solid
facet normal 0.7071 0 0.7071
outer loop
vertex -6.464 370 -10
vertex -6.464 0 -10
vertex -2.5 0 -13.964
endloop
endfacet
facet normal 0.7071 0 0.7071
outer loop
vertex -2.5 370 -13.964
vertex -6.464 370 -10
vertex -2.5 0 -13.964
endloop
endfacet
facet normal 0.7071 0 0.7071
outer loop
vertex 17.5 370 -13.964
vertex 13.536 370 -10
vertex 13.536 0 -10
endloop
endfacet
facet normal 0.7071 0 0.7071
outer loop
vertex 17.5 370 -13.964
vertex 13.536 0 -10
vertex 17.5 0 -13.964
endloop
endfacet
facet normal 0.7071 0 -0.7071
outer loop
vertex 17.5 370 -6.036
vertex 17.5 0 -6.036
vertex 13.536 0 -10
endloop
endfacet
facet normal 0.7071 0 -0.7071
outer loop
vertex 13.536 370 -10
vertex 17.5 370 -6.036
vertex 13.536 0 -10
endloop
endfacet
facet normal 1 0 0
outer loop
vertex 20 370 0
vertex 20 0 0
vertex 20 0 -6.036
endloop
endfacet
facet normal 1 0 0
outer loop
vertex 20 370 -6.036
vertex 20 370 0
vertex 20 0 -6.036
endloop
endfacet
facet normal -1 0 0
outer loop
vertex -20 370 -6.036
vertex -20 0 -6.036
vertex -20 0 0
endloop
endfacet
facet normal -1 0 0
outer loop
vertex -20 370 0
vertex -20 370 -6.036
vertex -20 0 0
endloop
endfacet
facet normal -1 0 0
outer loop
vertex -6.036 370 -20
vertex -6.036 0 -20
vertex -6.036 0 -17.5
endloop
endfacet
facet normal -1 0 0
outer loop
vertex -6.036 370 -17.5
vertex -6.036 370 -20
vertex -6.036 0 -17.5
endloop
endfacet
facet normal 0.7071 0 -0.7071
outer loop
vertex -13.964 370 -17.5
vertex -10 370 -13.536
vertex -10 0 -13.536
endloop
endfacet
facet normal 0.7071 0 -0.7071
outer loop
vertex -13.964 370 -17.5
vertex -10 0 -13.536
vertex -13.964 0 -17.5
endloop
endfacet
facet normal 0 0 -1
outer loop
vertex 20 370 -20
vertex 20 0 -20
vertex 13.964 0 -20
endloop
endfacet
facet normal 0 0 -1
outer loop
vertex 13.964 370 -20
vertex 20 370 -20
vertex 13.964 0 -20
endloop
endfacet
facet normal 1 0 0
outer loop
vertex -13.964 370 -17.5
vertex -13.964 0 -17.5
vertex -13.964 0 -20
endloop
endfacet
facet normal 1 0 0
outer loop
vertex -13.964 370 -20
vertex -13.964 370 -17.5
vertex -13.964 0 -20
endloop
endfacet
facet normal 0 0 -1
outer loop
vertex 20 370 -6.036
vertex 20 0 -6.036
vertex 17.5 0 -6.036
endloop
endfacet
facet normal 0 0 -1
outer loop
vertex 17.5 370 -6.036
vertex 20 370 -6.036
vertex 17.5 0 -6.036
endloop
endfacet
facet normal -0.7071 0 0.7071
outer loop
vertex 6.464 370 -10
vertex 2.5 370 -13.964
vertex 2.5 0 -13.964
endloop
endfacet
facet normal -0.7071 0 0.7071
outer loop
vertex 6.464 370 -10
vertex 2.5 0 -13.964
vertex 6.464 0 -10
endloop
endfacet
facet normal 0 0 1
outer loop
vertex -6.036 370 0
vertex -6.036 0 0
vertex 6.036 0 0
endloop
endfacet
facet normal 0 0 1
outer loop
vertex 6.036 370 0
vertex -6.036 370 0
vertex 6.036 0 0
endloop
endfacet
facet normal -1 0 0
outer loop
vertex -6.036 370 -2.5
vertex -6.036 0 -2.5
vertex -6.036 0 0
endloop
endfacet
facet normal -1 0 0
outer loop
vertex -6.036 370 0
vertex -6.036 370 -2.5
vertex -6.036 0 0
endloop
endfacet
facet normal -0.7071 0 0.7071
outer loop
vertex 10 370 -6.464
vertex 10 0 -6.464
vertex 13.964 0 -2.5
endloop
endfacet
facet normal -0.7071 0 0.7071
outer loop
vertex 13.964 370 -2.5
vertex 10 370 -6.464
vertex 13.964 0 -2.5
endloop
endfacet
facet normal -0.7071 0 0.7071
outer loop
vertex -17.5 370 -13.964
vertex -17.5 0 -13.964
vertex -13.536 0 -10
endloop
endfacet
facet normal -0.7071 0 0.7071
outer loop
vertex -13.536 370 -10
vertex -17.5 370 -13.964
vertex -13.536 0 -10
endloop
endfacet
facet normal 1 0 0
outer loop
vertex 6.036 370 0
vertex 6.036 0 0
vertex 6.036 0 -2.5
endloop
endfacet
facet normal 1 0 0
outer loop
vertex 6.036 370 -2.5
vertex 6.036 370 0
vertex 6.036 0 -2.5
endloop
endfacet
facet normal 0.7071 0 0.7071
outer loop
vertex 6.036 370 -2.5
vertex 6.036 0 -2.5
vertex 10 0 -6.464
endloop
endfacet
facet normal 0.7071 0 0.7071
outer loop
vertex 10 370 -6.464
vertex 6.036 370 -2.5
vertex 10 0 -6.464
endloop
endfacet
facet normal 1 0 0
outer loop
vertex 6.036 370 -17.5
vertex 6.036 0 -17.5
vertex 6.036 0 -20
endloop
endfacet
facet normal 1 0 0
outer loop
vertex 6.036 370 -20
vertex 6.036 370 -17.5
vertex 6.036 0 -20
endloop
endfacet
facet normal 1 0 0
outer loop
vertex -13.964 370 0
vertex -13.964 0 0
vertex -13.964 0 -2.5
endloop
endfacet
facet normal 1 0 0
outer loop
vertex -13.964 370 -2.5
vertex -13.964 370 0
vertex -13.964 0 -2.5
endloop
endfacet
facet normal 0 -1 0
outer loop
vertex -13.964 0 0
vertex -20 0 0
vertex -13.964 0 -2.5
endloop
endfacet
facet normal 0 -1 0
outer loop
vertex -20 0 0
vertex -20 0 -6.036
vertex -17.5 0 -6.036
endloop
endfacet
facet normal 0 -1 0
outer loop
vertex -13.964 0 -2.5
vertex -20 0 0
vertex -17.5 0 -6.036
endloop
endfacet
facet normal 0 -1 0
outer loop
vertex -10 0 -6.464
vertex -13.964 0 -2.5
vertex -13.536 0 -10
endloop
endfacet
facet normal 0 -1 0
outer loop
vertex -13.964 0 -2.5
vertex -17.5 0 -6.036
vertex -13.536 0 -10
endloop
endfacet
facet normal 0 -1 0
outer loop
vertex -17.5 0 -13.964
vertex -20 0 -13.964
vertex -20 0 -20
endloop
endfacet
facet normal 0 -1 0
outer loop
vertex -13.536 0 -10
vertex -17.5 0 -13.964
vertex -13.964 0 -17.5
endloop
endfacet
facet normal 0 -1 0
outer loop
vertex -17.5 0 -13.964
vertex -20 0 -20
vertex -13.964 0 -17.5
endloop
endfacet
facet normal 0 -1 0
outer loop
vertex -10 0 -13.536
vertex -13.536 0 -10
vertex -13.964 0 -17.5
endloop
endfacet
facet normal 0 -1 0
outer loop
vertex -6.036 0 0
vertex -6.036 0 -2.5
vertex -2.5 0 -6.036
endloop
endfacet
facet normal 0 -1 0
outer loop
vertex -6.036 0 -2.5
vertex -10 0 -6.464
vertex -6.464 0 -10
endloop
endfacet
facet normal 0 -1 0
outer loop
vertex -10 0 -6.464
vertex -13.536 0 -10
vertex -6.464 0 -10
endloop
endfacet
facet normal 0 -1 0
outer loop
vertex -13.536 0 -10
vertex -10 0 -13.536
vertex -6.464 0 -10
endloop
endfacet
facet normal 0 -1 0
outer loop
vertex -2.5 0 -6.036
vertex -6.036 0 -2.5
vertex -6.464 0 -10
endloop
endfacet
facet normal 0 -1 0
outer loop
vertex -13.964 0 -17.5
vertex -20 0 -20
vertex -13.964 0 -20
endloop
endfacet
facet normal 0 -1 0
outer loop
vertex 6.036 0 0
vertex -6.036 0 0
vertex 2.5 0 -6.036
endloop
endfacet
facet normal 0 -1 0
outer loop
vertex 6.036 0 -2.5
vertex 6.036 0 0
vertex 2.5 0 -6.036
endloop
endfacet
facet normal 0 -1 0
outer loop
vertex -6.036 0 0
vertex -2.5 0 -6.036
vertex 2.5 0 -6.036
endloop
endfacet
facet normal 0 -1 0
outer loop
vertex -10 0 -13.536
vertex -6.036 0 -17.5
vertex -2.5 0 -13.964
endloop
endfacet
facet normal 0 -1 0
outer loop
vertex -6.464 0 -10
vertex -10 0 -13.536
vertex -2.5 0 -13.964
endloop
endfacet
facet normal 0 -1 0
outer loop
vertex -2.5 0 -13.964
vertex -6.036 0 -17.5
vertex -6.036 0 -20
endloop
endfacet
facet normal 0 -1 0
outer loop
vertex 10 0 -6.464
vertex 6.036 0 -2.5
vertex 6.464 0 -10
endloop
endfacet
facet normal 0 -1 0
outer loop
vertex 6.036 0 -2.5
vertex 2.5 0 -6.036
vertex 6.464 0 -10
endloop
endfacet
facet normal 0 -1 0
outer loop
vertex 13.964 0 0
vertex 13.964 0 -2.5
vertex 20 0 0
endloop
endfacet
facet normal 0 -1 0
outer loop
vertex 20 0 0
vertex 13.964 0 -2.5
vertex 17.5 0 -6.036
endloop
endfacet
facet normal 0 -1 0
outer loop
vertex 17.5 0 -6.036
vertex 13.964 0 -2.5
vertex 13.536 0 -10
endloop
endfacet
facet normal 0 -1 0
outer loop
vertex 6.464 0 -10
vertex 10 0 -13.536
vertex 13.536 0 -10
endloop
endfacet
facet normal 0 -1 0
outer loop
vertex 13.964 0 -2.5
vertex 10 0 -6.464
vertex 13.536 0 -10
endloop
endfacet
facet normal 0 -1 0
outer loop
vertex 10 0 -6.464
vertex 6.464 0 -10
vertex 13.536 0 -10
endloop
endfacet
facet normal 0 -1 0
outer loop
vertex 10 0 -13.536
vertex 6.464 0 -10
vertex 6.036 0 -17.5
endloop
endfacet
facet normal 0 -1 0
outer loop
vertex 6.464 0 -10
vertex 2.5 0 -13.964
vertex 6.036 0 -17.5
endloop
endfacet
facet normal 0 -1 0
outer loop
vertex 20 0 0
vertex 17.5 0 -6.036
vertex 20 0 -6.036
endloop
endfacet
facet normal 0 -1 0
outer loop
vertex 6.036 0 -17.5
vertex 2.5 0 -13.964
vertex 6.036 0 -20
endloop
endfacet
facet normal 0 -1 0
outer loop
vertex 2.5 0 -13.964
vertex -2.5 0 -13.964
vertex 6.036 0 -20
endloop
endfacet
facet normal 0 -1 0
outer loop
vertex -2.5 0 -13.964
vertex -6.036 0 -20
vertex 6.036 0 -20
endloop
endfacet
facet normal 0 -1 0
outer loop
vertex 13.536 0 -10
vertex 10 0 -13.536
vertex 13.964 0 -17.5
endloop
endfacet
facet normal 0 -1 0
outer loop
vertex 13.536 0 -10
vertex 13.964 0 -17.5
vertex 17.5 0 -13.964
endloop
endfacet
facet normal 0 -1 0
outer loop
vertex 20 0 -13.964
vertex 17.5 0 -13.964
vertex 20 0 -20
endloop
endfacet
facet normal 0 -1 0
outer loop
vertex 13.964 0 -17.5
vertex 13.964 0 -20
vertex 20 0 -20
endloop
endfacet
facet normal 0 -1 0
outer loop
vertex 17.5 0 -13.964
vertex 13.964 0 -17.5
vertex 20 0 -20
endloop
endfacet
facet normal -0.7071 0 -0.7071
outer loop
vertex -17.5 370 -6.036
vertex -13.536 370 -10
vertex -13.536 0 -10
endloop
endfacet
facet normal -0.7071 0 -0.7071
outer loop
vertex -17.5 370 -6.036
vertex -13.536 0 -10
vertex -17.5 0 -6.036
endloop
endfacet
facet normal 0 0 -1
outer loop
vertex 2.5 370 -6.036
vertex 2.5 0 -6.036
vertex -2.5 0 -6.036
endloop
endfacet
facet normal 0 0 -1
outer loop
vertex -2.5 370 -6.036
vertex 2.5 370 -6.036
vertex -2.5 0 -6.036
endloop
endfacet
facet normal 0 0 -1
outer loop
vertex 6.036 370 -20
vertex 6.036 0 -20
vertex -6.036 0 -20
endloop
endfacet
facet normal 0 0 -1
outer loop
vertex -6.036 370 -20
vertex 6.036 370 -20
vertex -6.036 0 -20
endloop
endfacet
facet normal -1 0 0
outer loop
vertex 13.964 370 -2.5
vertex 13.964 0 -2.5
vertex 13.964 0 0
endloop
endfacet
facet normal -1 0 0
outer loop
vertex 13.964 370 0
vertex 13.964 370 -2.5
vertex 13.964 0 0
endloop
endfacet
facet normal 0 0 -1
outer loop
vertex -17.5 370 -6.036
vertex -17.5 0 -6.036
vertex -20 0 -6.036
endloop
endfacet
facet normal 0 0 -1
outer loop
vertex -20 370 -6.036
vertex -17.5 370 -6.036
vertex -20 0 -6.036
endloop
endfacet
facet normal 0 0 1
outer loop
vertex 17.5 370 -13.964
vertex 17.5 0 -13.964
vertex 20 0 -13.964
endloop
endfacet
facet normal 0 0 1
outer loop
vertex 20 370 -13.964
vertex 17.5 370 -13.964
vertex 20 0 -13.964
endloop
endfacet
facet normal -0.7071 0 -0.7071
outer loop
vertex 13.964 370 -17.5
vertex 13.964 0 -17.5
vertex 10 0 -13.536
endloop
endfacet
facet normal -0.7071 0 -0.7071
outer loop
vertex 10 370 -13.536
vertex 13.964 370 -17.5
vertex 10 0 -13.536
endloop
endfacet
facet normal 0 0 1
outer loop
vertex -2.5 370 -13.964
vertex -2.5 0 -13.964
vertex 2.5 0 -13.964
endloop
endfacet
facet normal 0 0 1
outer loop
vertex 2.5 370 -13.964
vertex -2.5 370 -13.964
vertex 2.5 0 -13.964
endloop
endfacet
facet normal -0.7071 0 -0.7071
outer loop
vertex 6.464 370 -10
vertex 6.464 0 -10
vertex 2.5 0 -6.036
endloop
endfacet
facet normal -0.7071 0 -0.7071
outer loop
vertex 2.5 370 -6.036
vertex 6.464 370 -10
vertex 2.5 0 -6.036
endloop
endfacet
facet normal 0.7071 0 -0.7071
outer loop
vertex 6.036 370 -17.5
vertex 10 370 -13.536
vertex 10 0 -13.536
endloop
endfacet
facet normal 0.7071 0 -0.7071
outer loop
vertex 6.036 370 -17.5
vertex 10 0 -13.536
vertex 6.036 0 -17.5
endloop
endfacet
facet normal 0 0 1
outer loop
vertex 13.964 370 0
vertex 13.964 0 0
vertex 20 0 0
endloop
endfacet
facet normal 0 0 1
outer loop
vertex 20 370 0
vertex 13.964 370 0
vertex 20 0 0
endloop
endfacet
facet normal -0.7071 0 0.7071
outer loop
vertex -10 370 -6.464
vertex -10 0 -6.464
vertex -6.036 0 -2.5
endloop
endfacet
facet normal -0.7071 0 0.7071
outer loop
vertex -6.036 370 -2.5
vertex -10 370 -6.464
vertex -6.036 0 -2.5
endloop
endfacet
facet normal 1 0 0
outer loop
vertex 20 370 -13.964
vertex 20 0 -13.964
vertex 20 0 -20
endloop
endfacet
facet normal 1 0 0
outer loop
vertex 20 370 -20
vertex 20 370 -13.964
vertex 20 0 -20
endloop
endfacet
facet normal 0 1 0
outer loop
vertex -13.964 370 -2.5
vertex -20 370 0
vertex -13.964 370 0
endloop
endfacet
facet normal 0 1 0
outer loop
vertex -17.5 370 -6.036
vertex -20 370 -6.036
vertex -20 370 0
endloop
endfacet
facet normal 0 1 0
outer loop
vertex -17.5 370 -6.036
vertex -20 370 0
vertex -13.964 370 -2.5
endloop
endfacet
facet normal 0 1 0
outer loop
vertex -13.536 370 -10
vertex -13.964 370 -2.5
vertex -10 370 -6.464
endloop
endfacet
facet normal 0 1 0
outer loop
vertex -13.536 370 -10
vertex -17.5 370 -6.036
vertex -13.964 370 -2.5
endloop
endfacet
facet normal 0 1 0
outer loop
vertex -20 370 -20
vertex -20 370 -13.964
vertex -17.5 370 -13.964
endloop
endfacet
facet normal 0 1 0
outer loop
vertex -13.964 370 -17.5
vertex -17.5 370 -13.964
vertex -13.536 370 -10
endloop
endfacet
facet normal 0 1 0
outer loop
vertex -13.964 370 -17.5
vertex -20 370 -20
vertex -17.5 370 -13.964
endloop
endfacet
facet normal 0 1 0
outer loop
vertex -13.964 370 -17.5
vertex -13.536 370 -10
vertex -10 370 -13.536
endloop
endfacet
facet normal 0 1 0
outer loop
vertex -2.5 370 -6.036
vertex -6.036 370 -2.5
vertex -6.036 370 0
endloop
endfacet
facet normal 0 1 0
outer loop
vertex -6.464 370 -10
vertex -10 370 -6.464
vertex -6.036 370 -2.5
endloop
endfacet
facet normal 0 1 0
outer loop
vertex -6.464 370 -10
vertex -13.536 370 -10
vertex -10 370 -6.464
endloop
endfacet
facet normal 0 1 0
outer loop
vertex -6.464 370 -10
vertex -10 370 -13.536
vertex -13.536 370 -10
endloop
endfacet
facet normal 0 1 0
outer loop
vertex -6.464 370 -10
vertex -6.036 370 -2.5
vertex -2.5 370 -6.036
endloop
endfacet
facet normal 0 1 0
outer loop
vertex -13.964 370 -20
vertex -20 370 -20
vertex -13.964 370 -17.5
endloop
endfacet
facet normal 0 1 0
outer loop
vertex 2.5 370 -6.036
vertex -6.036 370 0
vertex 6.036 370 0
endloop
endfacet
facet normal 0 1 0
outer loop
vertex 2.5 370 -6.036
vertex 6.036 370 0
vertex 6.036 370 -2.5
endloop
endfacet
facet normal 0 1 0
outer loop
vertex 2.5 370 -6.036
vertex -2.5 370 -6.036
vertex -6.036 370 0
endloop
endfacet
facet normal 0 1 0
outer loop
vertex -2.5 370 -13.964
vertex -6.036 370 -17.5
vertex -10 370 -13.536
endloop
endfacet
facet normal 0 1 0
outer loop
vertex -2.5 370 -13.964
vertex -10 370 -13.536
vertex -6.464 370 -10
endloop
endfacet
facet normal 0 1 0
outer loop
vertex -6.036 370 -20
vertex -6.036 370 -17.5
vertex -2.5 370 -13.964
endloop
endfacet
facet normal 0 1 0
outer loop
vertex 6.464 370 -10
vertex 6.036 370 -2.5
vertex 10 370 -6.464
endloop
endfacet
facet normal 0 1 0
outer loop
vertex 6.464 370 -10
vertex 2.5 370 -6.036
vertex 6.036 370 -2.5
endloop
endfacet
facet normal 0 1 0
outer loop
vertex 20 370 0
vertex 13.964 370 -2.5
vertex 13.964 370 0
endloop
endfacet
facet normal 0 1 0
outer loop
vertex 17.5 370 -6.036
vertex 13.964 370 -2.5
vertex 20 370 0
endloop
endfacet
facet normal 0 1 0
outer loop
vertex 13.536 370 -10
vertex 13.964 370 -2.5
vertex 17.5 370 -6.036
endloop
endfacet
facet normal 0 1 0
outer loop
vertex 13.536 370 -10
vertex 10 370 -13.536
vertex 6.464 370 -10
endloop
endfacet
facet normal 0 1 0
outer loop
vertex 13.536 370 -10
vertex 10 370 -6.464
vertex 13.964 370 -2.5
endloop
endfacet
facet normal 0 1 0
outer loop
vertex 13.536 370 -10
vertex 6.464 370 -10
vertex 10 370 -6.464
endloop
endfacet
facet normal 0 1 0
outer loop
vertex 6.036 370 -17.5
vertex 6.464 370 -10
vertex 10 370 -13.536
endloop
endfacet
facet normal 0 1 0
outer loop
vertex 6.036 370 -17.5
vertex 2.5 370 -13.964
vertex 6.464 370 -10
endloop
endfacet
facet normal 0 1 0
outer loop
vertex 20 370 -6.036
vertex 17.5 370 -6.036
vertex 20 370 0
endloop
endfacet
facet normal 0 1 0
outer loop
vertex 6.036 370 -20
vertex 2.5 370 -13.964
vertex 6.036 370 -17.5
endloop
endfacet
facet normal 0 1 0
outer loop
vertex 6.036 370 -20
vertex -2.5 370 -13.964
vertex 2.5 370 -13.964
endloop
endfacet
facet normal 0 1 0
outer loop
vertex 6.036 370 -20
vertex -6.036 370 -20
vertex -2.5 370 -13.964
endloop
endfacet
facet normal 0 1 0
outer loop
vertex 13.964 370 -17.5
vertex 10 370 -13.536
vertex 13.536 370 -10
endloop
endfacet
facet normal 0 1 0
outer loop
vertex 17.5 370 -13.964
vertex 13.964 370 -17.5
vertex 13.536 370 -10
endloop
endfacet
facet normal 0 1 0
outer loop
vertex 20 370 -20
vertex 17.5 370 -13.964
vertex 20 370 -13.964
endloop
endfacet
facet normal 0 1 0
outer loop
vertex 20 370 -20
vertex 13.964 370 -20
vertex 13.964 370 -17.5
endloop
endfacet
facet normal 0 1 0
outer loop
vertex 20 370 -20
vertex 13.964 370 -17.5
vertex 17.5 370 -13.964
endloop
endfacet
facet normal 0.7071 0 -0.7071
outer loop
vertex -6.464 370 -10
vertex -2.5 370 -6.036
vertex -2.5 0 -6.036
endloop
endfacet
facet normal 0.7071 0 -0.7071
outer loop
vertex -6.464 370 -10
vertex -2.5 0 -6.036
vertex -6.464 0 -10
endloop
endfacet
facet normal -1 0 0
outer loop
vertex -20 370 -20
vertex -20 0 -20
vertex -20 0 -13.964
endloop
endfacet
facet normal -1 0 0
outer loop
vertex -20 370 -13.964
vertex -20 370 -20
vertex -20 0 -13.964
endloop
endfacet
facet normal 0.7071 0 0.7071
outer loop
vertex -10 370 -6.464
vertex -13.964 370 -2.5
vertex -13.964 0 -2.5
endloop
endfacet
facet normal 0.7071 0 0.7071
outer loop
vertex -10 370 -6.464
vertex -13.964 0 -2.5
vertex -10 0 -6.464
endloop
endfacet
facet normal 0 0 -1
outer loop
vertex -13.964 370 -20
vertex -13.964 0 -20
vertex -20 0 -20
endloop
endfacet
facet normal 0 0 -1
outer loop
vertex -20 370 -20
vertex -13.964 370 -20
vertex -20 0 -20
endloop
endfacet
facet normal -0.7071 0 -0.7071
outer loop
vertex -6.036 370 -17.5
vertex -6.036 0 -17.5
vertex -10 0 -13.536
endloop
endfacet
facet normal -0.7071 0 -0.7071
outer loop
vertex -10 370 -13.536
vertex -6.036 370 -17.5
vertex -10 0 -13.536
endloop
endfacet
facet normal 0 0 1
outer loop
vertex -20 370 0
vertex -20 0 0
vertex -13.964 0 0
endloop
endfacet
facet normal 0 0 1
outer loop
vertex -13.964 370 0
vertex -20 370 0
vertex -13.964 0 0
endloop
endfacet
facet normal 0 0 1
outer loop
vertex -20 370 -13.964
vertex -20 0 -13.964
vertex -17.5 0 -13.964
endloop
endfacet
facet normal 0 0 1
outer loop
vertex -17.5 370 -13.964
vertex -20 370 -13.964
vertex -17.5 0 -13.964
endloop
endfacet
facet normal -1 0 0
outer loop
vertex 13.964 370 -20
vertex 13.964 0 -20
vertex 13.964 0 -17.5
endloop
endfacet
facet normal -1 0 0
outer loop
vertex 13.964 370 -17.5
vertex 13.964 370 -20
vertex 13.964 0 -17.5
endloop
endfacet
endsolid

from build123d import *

# Parameters (mm, degrees)
BOSS_EXTRU_2_DEPTH = 370


with BuildPart() as part:
    # Esquisse1<3> → Boss.-Extru.2 (new body)
    with BuildSketch(Plane(origin=(0, 0, 0), x_dir=(1, 0, 0), z_dir=(0, 1, 0))):
        Polygon((-6.035533906, 17.5), (-10, 13.535533906), (-13.964466094, 17.5), (-13.964466094, 20), (-20, 20), (-20, 13.964466094), (-17.5, 13.964466094), (-13.535533906, 10), (-17.5, 6.035533906), (-20, 6.035533906), (-20, 0), (-13.964466094, 0), (-13.964466094, 2.5), (-10, 6.464466094), (-6.035533906, 2.5), (-6.035533906, 0), (6.035533906, 0), (6.035533906, 2.5), (10, 6.464466094), (13.964466094, 2.5), (13.964466094, 0), (20, 0), (20, 6.035533906), (17.5, 6.035533906), (13.535533906, 10), (17.5, 13.964466094), (20, 13.964466094), (20, 20), (13.964466094, 20), (13.964466094, 17.5), (10, 13.535533906), (6.035533906, 17.5), (6.035533906, 20), (-6.035533906, 20), align=None)
        Polygon((-6.464466094, 10), (-2.5, 13.964466094), (2.5, 13.964466094), (6.464466094, 10), (2.5, 6.035533906), (-2.5, 6.035533906), align=None, mode=Mode.SUBTRACT)
    extrude(amount=BOSS_EXTRU_2_DEPTH)


solid = part.part
